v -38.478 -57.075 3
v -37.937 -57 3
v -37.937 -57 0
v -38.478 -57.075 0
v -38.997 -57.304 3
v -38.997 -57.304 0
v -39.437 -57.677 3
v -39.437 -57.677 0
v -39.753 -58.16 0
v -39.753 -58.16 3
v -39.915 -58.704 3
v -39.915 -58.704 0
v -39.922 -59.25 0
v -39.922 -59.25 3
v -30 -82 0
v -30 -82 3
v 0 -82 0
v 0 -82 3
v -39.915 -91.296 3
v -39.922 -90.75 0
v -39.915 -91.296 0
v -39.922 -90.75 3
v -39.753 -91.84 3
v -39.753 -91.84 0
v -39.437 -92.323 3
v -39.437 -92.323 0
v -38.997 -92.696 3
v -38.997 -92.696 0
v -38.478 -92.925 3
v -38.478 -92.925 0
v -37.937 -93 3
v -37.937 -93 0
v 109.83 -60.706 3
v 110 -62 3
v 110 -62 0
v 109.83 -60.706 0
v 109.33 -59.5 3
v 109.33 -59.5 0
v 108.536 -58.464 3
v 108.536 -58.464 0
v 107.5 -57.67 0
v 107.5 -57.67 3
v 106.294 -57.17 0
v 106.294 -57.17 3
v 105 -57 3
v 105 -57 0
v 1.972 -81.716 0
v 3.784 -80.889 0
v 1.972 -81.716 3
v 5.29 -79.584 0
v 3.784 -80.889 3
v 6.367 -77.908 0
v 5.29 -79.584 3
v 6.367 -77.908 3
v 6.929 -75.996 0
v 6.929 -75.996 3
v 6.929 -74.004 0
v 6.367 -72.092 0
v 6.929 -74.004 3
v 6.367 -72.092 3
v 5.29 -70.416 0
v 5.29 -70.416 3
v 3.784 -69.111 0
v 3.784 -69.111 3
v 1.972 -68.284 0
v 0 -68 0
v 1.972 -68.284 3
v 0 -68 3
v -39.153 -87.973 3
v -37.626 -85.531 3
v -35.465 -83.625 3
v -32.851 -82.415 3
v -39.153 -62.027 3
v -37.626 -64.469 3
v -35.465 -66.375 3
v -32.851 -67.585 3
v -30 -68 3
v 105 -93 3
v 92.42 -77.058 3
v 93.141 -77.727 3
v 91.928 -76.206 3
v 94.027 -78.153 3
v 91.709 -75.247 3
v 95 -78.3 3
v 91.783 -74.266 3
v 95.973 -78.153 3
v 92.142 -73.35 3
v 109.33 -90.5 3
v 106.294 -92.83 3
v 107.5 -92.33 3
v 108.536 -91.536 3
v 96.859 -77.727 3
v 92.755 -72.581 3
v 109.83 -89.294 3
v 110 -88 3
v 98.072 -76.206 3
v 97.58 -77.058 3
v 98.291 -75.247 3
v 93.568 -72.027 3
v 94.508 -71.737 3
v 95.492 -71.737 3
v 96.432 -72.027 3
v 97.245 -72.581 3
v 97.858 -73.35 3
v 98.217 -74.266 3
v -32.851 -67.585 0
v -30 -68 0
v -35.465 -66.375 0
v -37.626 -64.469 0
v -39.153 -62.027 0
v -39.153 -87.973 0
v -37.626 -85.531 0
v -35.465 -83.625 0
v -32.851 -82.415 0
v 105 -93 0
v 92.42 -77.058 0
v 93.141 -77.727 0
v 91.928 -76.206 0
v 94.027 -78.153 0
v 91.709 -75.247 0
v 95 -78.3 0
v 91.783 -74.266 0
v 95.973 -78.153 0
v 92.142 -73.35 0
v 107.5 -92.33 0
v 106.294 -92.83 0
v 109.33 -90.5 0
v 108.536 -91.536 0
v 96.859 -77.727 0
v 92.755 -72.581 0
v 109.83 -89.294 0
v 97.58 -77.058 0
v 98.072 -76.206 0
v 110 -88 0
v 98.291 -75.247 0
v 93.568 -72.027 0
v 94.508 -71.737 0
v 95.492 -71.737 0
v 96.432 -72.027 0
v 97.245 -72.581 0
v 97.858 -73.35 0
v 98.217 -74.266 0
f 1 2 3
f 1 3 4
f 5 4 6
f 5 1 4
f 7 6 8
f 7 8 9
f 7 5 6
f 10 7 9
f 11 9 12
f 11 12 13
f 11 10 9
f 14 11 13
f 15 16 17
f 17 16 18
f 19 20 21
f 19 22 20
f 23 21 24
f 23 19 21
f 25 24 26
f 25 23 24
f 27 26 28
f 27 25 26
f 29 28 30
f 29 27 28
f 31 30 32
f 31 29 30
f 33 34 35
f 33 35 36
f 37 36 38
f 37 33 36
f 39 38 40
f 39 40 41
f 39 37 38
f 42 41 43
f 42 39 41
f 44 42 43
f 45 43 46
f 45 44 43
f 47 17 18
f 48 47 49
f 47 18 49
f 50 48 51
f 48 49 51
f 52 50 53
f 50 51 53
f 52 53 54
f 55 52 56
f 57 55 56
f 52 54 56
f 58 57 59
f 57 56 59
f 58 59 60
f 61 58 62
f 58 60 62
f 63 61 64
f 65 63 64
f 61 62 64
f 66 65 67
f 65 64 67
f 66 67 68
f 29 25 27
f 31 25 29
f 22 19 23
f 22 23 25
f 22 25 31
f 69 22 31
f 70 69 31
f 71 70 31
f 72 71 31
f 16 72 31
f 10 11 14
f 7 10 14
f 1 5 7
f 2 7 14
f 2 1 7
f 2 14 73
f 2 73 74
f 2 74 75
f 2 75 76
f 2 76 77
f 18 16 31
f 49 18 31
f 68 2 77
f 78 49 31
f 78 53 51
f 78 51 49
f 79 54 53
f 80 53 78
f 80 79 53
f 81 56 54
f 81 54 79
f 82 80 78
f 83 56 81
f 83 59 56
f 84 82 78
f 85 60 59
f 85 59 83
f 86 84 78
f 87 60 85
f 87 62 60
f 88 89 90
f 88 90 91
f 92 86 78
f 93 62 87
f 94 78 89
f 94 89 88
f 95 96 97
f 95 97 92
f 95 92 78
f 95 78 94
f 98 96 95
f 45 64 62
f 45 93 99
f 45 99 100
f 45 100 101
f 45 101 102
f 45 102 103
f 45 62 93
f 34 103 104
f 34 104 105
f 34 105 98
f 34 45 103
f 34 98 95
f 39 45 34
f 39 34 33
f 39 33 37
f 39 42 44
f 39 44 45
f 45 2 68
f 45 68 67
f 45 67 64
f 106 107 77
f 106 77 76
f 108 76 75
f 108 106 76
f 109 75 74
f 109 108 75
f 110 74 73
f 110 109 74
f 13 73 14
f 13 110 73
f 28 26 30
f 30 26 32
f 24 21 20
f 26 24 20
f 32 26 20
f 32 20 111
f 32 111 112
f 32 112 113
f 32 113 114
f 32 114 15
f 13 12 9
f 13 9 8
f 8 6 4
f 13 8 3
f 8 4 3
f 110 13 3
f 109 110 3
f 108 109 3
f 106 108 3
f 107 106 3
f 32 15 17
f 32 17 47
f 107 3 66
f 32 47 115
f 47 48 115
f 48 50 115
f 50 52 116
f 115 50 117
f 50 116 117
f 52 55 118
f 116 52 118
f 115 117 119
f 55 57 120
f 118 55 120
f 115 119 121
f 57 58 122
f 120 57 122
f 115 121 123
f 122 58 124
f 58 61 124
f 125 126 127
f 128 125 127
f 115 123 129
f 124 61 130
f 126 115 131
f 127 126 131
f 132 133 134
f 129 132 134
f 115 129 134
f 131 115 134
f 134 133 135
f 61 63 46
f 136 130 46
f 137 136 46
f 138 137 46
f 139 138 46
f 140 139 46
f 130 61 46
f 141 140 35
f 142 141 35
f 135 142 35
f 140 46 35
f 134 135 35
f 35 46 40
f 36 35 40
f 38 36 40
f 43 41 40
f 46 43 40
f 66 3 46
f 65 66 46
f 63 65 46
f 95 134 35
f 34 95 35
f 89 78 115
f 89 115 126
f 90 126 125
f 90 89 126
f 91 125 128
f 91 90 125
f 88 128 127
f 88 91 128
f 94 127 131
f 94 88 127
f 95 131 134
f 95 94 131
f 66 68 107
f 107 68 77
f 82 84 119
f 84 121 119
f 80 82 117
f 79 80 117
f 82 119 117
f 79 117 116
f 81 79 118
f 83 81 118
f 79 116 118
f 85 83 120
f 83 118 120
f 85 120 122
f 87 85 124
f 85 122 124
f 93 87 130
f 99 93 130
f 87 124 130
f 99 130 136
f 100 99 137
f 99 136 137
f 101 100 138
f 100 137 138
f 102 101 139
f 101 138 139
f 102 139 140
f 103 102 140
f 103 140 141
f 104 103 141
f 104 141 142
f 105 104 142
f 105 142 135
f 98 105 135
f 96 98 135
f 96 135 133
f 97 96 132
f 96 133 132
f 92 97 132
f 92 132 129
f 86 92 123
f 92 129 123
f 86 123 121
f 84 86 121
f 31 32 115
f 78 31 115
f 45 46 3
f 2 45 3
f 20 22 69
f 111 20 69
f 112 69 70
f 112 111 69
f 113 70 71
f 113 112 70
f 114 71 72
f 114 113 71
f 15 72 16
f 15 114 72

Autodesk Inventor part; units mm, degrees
ref_plane "YZ Plane" through (0, 0, 0) normal (1, 0, 0) x (0, 1, 0)
ref_plane "XZ Plane" through (0, 0, 0) normal (0, 1, 0) x (-1, 0, 0)
ref_plane "XY Plane" through (0, 0, 0) normal (0, 0, 1) x (1, 0, 0)
ref_plane "作業平面1" through (0, 0, 0) normal (0, 0, 1) x (1, 0, 0)
sketch "スケッチ2" plane through (0, 0, 0) normal (0, 0, 1) x (1, 0, 0)
  line L0 (110, -57) -> (-40, -57)
  line L1 (-40, -57) -> (-40, -93)
  line L2 (-40, -93) -> (110, -93)
  line L3 (110, -93) -> (110, -57)
  circle A0 centre (0, -75) radius 6 construction
  circle A1 centre (0, -75) radius 75 construction
  point P0 (0, 0)
  dimension "d1" = 150
  dimension "d2" = 18
  dimension "d3" = 18
  dimension "d4" = 40
  dimension "d29" = 110
extrude "押し出し1" add sketch "スケッチ2" along normal blind 3
sketch "スケッチ3" plane through (0, 0, 3) normal (0, 0, 1) x (1, 0, 0)
  circle A0 centre (0, -75) radius 6 construction
  circle A1 centre (0, -75) radius 7
  line L0 (0, -68) -> (-38.1, -68) construction
  line L1 (-38.1, -68) -> (-38.1, -82) construction
  line L2 (-38.1, -82) -> (0, -82) construction
  line L3 (0, -82) -> (0, -68) construction
  line L4 (0, -68) -> (-40, -68)
  line L5 (-40, -68) -> (-40, -82)
  line L6 (-40, -82) -> (0, -82)
  line L7 (0, -82) -> (0, -68)
  line L8 (-40, -57) -> (-40, -93) projected
  point P0 (0, 0)
  point P1 (0, -82)
  dimension "d8" = 14
extrude "押し出し2" cut sketch "スケッチ3" against normal blind 14
fillet "フィレット1" radius 10 2 edges at (-40, -68, 1.5) (-40, -82, 1.5)
ref_plane "作業平面2" through (-40, -75, 0) normal (0, -1, 0) x (1, 0, 0)
sketch "スケッチ4" plane through (0, 0, 3) normal (0, 0, 1) x (1, 0, 0)
  line L0 (-40, -93) -> (110, -93) projected
  line L1 (110, -57) -> (-40, -57) projected
  line L2 (110, -93) -> (110, -57) projected
  point P0 (0, 0)
  point P1 (95, -75)
  dimension "d25" = 15
  dimension "d26" = 36
  dimension "d27" = 18
hole "穴1" at (95, -75, 3) direction (0, 0, -1) diameter 6.6 end through all
fillet "フィレット2" radius 5 2 edges at (110, -57, 1.5) (110, -93, 1.5)
fillet "フィレット2" radius 2 2 edges at (-40, -57, 1.5) (-40, -93, 1.5)
equation "\"d3\" = d2"
equation "\"d9\" = d8"
equation "\"d27\" = 0.5 * d26"
properties part number "wheel_mount" material "アルミニウム 6061"
